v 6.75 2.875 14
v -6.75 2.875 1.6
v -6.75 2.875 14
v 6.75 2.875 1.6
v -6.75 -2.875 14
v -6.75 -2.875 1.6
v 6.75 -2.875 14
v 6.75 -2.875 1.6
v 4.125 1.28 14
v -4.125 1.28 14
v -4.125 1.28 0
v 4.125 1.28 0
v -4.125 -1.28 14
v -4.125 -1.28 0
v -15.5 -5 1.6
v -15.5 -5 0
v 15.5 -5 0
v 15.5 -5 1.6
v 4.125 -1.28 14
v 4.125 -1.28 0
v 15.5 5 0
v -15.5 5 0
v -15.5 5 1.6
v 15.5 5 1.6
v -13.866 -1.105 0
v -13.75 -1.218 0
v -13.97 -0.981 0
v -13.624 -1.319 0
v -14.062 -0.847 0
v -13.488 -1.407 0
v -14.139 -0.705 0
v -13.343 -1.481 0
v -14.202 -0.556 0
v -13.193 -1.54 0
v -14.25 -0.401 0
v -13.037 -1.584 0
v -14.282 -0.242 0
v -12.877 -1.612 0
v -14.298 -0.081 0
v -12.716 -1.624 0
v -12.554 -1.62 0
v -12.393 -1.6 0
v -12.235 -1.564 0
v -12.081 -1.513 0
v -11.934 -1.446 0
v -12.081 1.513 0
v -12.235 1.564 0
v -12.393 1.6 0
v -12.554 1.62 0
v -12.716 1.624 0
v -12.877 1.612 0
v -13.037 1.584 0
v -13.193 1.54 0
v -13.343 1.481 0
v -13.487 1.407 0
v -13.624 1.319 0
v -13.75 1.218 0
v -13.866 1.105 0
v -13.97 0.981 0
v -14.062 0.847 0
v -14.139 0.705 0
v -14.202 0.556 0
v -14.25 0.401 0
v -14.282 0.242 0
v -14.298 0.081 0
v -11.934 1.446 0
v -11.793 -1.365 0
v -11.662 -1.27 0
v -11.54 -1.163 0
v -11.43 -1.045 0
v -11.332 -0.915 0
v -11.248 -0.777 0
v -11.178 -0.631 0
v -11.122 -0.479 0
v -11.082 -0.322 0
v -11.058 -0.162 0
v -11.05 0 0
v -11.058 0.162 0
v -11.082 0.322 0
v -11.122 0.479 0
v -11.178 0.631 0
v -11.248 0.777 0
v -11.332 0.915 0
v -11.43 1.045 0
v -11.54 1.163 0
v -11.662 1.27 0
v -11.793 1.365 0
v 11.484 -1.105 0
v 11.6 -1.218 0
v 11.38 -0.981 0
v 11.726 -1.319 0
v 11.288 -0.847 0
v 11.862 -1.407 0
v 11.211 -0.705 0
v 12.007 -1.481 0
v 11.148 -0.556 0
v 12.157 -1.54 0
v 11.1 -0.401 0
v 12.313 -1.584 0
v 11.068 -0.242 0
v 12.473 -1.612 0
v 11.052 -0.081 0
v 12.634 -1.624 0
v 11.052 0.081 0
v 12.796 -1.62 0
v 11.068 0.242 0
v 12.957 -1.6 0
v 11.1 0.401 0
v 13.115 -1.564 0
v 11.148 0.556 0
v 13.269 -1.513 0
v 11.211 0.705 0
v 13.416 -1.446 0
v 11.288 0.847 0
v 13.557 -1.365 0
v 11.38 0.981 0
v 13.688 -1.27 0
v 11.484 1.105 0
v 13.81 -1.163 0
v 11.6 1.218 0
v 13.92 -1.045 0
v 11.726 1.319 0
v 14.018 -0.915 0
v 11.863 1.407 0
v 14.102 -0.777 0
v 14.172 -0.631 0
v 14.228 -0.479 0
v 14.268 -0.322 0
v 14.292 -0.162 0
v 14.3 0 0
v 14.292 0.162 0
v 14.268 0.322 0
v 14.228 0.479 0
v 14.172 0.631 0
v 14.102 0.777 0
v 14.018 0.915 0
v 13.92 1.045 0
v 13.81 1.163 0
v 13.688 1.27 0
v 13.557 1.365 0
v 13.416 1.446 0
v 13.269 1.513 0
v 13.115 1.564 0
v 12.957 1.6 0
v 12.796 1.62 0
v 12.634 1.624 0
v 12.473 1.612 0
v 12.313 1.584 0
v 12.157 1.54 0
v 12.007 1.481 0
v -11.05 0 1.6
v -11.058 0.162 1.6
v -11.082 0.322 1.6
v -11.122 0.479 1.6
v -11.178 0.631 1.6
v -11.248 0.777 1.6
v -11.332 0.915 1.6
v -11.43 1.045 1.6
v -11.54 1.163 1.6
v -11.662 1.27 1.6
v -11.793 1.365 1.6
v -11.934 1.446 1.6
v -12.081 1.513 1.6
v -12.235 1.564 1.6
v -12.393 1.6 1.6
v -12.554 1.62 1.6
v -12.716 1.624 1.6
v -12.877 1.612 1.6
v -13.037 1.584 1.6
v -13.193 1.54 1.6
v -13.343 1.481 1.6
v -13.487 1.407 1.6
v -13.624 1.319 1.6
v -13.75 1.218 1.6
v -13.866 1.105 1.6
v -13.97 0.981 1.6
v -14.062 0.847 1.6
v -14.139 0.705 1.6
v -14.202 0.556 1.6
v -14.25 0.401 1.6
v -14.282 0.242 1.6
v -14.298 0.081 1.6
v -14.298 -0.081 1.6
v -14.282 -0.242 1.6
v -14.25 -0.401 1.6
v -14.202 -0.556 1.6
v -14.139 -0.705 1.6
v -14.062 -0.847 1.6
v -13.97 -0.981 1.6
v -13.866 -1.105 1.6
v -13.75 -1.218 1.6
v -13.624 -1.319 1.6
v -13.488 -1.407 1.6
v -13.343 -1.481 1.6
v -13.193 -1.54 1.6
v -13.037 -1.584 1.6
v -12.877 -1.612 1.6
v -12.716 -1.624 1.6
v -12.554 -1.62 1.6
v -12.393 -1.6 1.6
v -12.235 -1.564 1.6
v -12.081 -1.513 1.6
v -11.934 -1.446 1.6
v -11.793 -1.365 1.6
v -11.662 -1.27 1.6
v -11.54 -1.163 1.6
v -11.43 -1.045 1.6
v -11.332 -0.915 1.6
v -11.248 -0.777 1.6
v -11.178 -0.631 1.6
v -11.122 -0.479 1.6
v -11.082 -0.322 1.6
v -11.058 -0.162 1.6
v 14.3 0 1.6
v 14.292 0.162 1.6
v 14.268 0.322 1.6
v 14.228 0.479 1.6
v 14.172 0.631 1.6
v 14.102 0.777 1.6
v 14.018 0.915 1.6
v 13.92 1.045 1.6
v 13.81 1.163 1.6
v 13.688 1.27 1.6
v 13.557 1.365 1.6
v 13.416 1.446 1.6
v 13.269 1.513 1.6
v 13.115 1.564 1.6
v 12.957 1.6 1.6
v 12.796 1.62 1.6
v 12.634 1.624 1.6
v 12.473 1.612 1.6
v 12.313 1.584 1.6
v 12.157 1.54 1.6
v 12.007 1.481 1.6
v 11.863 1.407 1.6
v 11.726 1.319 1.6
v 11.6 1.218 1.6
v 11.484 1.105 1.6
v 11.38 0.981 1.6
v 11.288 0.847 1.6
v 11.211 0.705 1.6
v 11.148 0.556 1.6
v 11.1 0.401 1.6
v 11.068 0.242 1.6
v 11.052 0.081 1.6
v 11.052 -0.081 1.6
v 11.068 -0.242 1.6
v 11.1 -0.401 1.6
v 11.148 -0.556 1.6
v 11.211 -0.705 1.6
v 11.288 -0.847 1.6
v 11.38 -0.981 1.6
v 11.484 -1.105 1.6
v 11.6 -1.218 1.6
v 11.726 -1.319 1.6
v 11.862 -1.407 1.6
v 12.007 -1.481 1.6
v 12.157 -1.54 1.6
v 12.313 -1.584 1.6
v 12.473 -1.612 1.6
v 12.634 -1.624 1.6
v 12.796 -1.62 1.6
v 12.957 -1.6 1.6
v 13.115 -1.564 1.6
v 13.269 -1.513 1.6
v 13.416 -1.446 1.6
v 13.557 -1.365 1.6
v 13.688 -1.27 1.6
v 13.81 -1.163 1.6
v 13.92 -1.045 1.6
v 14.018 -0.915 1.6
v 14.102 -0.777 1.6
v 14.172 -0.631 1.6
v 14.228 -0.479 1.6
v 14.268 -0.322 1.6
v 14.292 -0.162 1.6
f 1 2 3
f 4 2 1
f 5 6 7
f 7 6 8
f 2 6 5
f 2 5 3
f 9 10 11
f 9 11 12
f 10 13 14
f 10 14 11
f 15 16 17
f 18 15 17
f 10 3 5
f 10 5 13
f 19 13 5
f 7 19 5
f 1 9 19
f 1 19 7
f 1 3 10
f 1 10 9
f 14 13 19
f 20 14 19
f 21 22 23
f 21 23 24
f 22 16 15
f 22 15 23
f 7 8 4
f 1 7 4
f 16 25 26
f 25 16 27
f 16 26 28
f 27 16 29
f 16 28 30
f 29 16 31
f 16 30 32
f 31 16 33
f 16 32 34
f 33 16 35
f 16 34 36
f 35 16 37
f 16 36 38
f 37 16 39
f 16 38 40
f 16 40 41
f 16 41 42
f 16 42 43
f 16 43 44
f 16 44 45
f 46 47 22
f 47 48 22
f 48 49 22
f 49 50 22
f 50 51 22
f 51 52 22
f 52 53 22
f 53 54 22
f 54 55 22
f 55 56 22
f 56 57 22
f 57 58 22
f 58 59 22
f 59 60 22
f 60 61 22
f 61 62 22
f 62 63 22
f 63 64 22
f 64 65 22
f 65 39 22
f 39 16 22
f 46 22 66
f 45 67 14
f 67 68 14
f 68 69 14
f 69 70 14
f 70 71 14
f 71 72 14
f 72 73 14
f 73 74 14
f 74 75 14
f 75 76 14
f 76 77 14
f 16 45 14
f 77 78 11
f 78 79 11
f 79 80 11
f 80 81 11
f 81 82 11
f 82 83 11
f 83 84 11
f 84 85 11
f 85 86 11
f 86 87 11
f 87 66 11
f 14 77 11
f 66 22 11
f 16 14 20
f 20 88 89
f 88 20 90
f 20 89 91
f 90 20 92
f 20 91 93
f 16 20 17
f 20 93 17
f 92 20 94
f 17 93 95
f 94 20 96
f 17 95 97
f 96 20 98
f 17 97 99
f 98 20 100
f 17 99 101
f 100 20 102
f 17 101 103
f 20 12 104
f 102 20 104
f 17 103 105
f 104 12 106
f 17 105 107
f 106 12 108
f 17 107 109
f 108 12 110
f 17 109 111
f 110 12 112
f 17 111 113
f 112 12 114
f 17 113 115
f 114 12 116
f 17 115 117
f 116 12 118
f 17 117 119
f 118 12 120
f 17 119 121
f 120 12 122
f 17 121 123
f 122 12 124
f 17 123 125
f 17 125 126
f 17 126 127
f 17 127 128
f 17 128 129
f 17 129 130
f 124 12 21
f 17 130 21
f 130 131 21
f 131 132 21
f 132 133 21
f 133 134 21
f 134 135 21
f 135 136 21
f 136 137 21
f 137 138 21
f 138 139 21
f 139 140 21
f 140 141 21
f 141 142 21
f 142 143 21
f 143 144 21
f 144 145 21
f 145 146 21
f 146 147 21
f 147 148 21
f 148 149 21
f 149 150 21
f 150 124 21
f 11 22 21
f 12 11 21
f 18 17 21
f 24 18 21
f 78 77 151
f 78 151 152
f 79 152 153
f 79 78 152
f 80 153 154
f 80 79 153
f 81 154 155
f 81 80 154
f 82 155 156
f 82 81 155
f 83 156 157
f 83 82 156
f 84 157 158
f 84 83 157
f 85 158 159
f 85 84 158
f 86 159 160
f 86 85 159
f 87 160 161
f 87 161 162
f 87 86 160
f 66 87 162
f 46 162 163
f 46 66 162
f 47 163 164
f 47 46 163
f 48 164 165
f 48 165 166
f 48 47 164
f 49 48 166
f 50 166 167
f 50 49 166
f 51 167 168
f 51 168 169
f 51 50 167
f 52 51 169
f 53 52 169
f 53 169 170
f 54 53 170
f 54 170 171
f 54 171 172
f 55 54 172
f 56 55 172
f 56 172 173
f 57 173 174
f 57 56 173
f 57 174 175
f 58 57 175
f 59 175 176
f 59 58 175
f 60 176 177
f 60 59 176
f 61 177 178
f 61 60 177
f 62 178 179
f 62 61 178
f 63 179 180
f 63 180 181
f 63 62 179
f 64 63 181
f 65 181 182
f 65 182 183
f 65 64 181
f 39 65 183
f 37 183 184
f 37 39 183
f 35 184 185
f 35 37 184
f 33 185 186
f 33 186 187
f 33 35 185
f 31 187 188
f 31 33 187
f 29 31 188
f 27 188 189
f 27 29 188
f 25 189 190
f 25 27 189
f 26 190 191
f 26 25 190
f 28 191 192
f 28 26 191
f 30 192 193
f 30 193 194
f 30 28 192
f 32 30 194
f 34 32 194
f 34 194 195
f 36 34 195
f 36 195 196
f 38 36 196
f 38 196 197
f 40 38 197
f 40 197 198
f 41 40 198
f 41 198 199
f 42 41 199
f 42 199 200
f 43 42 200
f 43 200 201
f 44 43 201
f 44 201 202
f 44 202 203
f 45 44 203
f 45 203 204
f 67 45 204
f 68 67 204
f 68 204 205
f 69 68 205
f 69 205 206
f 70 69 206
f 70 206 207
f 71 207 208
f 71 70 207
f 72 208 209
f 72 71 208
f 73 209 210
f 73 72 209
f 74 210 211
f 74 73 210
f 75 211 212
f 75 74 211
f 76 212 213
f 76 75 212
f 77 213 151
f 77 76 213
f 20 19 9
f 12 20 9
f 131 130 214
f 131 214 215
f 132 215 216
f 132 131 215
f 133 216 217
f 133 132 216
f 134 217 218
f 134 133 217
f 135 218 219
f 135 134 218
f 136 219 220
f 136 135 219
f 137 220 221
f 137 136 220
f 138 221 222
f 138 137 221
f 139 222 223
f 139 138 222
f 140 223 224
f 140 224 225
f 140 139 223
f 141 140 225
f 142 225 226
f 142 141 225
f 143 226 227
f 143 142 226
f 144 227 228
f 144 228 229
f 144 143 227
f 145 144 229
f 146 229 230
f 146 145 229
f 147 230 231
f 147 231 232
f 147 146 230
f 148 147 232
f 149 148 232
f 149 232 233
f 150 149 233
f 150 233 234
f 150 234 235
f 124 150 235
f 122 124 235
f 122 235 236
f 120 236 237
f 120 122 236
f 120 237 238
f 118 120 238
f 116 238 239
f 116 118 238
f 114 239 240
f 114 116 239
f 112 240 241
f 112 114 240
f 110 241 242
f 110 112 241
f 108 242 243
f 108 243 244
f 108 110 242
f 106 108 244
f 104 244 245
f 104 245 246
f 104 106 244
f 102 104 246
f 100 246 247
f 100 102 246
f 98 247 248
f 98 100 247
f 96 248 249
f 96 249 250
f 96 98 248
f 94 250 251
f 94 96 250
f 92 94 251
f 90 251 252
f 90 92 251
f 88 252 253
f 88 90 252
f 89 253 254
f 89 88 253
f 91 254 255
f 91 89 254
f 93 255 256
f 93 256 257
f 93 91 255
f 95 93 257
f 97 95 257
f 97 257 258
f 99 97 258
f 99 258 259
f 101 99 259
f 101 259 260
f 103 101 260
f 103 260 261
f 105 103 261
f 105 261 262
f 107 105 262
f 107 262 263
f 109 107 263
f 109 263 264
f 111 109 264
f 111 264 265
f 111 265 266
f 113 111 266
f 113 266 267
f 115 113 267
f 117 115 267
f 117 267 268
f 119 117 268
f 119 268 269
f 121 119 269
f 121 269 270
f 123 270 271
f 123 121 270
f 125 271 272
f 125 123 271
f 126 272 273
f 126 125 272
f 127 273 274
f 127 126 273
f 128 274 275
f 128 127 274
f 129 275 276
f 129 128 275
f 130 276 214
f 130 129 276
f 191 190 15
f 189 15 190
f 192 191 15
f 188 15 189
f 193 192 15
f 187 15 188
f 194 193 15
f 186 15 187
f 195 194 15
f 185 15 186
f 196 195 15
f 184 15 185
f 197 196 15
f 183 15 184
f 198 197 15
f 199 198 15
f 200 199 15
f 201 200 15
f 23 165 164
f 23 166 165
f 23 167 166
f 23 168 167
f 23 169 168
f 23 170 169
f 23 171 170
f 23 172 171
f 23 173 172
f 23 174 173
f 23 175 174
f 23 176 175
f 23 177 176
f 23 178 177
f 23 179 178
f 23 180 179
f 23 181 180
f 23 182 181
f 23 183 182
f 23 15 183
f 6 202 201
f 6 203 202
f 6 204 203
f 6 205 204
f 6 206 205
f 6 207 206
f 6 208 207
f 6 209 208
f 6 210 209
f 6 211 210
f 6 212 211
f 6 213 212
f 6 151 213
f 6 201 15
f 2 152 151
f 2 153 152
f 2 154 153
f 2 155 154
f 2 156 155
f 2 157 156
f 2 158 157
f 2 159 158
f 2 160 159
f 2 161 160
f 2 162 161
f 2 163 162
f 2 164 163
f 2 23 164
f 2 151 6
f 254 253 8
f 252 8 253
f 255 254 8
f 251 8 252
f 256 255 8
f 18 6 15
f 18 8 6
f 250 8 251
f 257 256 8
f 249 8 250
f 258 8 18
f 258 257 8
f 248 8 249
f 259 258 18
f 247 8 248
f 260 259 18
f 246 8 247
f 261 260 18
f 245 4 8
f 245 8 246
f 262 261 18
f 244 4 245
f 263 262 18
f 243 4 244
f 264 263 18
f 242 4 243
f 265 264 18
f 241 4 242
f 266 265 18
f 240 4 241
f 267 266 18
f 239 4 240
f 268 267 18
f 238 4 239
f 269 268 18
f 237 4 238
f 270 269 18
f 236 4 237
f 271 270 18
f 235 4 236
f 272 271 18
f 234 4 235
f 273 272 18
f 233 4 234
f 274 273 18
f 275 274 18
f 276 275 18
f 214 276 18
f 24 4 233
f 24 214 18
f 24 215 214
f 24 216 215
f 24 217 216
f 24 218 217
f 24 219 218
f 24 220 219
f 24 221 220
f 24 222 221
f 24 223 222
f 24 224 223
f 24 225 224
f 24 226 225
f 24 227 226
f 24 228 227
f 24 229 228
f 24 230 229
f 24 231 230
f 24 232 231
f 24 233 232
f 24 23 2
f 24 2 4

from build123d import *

# Parameters (mm, degrees)
SKETCH_W     = 31
SKETCH_H     = 10
SKETCH_R     = 1.625
PAD_DEPTH    = 1.6
SKETCH001_W  = 13.5
SKETCH001_H  = 5.75
PAD001_DEPTH = 12.4
SKETCH002_W  = 8.25
SKETCH002_H  = 2.56
POCKET_DEPTH = 14.001


with BuildPart() as part:
    # Sketch → Pad (new body)
    with BuildSketch(Plane.XY):
        Rectangle(SKETCH_W, SKETCH_H)
        with Locations((-12.675, 0)):
            Circle(SKETCH_R, mode=Mode.SUBTRACT)
        with Locations((12.675, 0)):
            Circle(SKETCH_R, mode=Mode.SUBTRACT)
    extrude(amount=PAD_DEPTH)

    # Sketch001 (on Face8 of Pad) → Pad001 (join)
    with BuildSketch(Plane.XY.offset(1.6)):
        Rectangle(SKETCH001_W, SKETCH001_H)
    extrude(amount=PAD001_DEPTH)

    # Sketch002 (on Face13 of Pad001) → Pocket (cut, through all)
    with BuildSketch(Plane.XY.offset(14)):
        Rectangle(SKETCH002_W, SKETCH002_H)
    extrude(amount=-POCKET_DEPTH, mode=Mode.SUBTRACT)


solid = part.part
